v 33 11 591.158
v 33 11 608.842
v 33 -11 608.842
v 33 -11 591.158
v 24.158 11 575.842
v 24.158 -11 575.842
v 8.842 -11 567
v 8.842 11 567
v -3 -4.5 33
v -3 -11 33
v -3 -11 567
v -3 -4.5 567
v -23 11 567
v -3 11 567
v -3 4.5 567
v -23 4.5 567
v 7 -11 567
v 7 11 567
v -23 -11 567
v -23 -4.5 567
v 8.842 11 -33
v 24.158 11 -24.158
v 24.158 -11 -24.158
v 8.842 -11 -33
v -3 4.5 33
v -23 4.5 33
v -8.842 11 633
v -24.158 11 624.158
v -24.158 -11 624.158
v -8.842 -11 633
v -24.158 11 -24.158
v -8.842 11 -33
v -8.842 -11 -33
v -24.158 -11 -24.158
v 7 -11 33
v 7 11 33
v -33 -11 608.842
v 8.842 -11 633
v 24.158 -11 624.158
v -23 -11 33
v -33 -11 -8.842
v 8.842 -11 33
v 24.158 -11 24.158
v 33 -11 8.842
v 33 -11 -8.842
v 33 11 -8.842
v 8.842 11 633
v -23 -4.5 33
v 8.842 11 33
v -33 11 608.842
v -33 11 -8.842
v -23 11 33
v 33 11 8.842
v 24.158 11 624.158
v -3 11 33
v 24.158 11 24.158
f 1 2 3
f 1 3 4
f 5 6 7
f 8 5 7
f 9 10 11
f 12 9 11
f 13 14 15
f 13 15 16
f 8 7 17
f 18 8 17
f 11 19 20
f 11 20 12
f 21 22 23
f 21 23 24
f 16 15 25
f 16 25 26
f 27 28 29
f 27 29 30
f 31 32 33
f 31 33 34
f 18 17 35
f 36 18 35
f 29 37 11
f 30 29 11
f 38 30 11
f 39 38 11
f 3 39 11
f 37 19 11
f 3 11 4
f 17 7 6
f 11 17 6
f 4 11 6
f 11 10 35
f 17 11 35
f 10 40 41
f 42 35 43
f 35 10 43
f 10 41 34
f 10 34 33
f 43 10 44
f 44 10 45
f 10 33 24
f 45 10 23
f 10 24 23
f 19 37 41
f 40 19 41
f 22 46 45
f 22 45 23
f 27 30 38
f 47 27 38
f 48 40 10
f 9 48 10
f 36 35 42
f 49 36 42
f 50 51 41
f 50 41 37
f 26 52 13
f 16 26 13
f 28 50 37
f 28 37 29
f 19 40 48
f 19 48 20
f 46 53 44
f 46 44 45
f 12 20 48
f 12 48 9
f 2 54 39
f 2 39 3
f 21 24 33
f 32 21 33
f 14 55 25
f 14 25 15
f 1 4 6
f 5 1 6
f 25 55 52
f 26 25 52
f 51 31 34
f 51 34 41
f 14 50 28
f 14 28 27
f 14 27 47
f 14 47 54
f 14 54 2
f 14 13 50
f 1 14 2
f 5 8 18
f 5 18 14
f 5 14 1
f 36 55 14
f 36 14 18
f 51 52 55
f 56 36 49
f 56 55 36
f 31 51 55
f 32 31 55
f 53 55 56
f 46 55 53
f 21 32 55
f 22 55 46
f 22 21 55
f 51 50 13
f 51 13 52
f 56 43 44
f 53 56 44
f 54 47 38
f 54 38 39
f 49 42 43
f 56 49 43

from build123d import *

# Parameters (mm, degrees)
BOSS_EXTRUDE1_DEPTH = 22
CUT_EXTRUDE1_DEPTH  = 635.24127901
SKETCH3_W           = 20
SKETCH3_H           = 534
CUT_EXTRUDE2_DEPTH  = 6.5
SKETCH4_W           = 20
SKETCH4_H           = 534
CUT_EXTRUDE3_DEPTH  = 6.5


with BuildPart() as part:
    # Sketch1 → Boss-Extrude1 (new body)
    with BuildSketch(Plane(origin=(0, 11, 0), x_dir=(1, 0, 0), z_dir=(0, 1, 0))):
        Polygon((24.15767665, 24.15767665), (8.84232335, 33), (-8.84232335, 33), (-24.15767665, 24.15767665), (-33, 8.84232335), (-33, -608.84232335), (-24.15767665, -624.15767665), (-8.84232335, -633), (8.84232335, -633), (24.15767665, -624.15767665), (33, -608.84232335), (33, 8.84232335), align=None)
    extrude(amount=-BOSS_EXTRUDE1_DEPTH)

    # Sketch2 → Cut-Extrude1 (cut, through all)
    with BuildSketch(Plane.XZ.offset(11)):
        Polygon((33, 8.84232335), (33, 591.15767665), (24.15767665, 575.84232335), (8.84232335, 567), (7, 567), (7, 33), (8.84232335, 33), (24.15767665, 24.15767665), align=None)
    extrude(amount=-CUT_EXTRUDE1_DEPTH, mode=Mode.SUBTRACT)

    # Sketch3 → Cut-Extrude2 (cut)
    with BuildSketch(Plane.XZ.offset(11)):
        with Locations((-13, 300)):
            Rectangle(SKETCH3_W, SKETCH3_H)
    extrude(amount=-CUT_EXTRUDE2_DEPTH, mode=Mode.SUBTRACT)

    # Sketch4 → Cut-Extrude3 (cut)
    with BuildSketch(Plane(origin=(0, 11, 0), x_dir=(-1, 0, 0), z_dir=(0, 1, 0))):
        with Locations((13, 300)):
            Rectangle(SKETCH4_W, SKETCH4_H)
    extrude(amount=-CUT_EXTRUDE3_DEPTH, mode=Mode.SUBTRACT)


solid = part.part
